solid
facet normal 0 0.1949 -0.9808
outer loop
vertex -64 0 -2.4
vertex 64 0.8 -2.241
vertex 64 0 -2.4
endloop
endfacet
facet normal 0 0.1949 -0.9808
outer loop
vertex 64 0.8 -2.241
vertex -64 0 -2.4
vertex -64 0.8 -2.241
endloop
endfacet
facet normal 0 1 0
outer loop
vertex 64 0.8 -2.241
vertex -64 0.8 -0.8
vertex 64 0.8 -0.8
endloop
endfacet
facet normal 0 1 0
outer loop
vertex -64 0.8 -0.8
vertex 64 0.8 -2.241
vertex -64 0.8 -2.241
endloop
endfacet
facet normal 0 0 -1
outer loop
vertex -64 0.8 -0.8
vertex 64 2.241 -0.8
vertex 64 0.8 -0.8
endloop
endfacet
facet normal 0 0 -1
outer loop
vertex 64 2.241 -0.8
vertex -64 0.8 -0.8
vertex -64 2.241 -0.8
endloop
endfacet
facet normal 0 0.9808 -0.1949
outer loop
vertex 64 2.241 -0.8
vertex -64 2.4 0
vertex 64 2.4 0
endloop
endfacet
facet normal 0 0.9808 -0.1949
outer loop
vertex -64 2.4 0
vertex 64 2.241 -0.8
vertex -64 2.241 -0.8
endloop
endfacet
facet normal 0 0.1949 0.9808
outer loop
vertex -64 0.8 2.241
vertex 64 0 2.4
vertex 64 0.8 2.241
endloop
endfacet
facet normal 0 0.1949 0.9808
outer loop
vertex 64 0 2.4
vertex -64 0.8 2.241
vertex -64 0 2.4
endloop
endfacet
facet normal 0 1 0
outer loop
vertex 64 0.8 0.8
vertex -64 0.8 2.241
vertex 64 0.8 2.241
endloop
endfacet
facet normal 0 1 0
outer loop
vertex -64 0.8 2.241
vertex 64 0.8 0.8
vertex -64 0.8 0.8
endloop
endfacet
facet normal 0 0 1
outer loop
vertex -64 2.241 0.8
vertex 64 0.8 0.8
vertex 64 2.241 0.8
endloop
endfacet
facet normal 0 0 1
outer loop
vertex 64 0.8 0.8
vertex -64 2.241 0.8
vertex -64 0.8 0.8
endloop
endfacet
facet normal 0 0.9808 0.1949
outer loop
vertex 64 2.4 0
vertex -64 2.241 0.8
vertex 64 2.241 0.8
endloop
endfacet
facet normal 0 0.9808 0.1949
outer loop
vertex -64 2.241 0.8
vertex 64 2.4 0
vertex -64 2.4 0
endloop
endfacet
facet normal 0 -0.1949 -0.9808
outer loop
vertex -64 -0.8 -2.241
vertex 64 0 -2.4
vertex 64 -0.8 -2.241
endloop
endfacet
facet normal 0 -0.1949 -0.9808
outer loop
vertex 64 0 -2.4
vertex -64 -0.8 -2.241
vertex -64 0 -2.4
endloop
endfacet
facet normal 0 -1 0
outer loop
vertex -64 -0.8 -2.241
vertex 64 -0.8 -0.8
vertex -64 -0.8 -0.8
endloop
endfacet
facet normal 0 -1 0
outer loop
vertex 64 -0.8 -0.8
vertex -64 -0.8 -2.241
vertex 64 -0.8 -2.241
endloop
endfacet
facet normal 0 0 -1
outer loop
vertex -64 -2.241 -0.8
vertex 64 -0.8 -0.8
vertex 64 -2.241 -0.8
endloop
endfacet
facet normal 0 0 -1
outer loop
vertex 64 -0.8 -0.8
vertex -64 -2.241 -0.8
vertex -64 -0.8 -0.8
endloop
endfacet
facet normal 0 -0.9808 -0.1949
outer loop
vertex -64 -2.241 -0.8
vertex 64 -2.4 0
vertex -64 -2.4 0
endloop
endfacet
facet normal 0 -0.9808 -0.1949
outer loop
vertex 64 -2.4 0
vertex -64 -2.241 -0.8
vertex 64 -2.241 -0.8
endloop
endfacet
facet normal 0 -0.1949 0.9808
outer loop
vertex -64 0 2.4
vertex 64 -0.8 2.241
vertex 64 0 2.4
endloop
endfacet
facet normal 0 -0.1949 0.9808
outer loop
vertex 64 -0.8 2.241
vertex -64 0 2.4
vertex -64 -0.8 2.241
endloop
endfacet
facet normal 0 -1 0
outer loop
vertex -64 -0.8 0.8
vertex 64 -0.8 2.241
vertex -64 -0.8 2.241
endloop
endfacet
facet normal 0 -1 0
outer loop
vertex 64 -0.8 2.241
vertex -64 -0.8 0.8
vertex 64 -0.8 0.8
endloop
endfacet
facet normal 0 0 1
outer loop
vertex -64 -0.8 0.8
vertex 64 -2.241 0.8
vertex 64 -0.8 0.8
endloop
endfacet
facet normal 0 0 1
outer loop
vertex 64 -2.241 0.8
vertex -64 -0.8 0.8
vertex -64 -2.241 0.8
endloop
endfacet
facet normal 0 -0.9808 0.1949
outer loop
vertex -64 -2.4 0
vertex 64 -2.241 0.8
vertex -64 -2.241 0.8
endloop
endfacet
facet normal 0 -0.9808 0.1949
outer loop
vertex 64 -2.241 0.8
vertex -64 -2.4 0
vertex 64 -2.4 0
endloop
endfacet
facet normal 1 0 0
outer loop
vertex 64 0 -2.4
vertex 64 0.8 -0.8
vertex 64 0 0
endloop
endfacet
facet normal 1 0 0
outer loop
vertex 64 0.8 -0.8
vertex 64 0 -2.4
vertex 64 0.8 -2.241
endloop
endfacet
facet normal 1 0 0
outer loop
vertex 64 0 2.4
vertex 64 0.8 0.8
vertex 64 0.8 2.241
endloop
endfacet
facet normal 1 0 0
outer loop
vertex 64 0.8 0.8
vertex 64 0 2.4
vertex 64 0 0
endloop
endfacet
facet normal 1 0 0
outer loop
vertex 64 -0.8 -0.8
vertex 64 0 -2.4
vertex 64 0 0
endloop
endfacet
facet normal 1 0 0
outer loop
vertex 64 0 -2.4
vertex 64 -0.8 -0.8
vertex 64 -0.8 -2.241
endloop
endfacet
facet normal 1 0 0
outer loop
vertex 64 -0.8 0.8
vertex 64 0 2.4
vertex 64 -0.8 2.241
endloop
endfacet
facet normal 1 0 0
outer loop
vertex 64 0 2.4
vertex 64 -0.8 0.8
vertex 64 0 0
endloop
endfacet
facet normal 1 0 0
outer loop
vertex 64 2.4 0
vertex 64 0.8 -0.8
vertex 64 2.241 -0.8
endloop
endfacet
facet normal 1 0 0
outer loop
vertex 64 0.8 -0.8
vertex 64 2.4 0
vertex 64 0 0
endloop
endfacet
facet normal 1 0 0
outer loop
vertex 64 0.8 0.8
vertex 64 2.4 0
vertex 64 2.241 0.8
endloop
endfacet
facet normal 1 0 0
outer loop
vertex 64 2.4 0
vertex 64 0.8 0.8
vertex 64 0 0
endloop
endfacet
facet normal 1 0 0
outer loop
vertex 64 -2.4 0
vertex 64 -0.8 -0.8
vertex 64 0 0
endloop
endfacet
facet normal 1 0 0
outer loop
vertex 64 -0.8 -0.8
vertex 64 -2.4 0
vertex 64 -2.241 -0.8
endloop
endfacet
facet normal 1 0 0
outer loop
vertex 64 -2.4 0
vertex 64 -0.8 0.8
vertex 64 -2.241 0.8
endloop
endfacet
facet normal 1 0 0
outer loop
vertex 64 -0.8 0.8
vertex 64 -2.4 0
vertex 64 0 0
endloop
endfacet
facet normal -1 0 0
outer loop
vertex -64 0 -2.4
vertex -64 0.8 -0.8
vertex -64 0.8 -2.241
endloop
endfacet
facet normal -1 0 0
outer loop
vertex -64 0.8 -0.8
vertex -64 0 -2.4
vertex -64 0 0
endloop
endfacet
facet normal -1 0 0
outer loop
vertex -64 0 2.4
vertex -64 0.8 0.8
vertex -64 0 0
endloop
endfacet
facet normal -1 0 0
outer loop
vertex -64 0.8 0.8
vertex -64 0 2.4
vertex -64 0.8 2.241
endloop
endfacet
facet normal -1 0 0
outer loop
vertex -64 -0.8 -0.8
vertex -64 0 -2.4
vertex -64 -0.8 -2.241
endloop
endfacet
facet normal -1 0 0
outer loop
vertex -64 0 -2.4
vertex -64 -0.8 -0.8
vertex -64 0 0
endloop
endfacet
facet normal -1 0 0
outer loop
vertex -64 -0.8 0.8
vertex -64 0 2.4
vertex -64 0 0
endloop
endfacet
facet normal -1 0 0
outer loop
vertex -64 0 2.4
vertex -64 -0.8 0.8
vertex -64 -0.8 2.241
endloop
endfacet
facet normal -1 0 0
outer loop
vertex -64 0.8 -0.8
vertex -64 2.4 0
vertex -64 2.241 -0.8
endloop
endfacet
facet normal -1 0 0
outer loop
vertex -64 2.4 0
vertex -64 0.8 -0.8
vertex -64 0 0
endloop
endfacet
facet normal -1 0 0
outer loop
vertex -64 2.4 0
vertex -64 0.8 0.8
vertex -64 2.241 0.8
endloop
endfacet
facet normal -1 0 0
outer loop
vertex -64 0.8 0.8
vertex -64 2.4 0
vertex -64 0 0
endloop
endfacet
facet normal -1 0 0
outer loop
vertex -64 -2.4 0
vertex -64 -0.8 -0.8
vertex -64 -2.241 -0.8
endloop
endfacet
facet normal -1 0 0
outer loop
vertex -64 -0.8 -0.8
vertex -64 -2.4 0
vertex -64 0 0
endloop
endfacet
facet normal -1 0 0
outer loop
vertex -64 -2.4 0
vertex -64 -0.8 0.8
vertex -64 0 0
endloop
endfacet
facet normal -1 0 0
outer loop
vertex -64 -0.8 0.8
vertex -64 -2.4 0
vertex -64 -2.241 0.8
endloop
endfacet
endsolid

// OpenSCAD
// file: ../p/axle.scad
use <../lib.scad>
function ldraw_lib__axle() = [
// 0 Axle
// 0 Name: axle.dat
// 0 Author: James Jessiman
// 0 !LDRAW_ORG Primitive UPDATE 2003-01
// 0 !LICENSE Licensed under CC BY 2.0 and CC BY 4.0 : see CAreadme.txt
// 
// 0 BFC CERTIFY CCW
  [0,"BFC","CERTIFY"],
  [0,"BFC","CCW"],
// 
// 0 !HISTORY 2000-04-23 [sbliss] Added conditional edges along outermost diameters
// 0 !HISTORY 2000-05-07 [PTadmin] Official Update 2000-01
// 0 !HISTORY 2002-11-08 [OrionP] Adjusted fit and precision
// 0 !HISTORY 2003-03-12 [PTadmin] Official Update 2003-01
// 0 !HISTORY 2007-06-24 [PTadmin] Header formatted for Contributor Agreement
// 0 !HISTORY 2008-07-01 [PTadmin] Official Update 2008-01
// 
// 
// 5 24 6 0 0 6 1 0 5.602 0 2 5.602 0 -2
  [5,24,6,0,0,6,1,0,5.602,0,2,5.602,0,-2],
// 5 24 0 0 6 0 1 6 2 0 5.602 -2 0 5.602
  [5,24,0,0,6,0,1,6,2,0,5.602,-2,0,5.602],
// 5 24 -6 0 0 -6 1 0 -5.602 0 -2 -5.602 0 2
  [5,24,-6,0,0,-6,1,0,-5.602,0,-2,-5.602,0,2],
// 5 24 0 0 -6 0 1 -6 -2 0 -5.602 2 0 -5.602
  [5,24,0,0,-6,0,1,-6,-2,0,-5.602,2,0,-5.602],
// 
// 2 24 6 0 0 5.602 0 2
  [2,24,6,0,0,5.602,0,2],
// 2 24 5.602 0 2 2 0 2
  [2,24,5.602,0,2,2,0,2],
// 2 24 2 0 2 2 0 5.602
  [2,24,2,0,2,2,0,5.602],
// 2 24 2 0 5.602 0 0 6
  [2,24,2,0,5.602,0,0,6],
// 2 24 -6 0 0 -5.602 0 2
  [2,24,-6,0,0,-5.602,0,2],
// 2 24 -5.602 0 2 -2 0 2
  [2,24,-5.602,0,2,-2,0,2],
// 2 24 -2 0 2 -2 0 5.602
  [2,24,-2,0,2,-2,0,5.602],
// 2 24 -2 0 5.602 -0 0 6
  [2,24,-2,0,5.602,-0,0,6],
// 2 24 6 0 -0 5.602 0 -2
  [2,24,6,0,-0,5.602,0,-2],
// 2 24 5.602 0 -2 2 0 -2
  [2,24,5.602,0,-2,2,0,-2],
// 2 24 2 0 -2 2 0 -5.602
  [2,24,2,0,-2,2,0,-5.602],
// 2 24 2 0 -5.602 0 0 -6
  [2,24,2,0,-5.602,0,0,-6],
// 2 24 -6 0 -0 -5.602 0 -2
  [2,24,-6,0,-0,-5.602,0,-2],
// 2 24 -5.602 0 -2 -2 0 -2
  [2,24,-5.602,0,-2,-2,0,-2],
// 2 24 -2 0 -2 -2 0 -5.602
  [2,24,-2,0,-2,-2,0,-5.602],
// 2 24 -2 0 -5.602 -0 0 -6
  [2,24,-2,0,-5.602,-0,0,-6],
// 2 24 6 1 0 5.602 1 2
  [2,24,6,1,0,5.602,1,2],
// 2 24 5.602 1 2 2 1 2
  [2,24,5.602,1,2,2,1,2],
// 2 24 2 1 2 2 1 5.602
  [2,24,2,1,2,2,1,5.602],
// 2 24 2 1 5.602 0 1 6
  [2,24,2,1,5.602,0,1,6],
// 2 24 -6 1 0 -5.602 1 2
  [2,24,-6,1,0,-5.602,1,2],
// 2 24 -5.602 1 2 -2 1 2
  [2,24,-5.602,1,2,-2,1,2],
// 2 24 -2 1 2 -2 1 5.602
  [2,24,-2,1,2,-2,1,5.602],
// 2 24 -2 1 5.602 -0 1 6
  [2,24,-2,1,5.602,-0,1,6],
// 2 24 6 1 -0 5.602 1 -2
  [2,24,6,1,-0,5.602,1,-2],
// 2 24 5.602 1 -2 2 1 -2
  [2,24,5.602,1,-2,2,1,-2],
// 2 24 2 1 -2 2 1 -5.602
  [2,24,2,1,-2,2,1,-5.602],
// 2 24 2 1 -5.602 0 1 -6
  [2,24,2,1,-5.602,0,1,-6],
// 2 24 -6 1 -0 -5.602 1 -2
  [2,24,-6,1,-0,-5.602,1,-2],
// 2 24 -5.602 1 -2 -2 1 -2
  [2,24,-5.602,1,-2,-2,1,-2],
// 2 24 -2 1 -2 -2 1 -5.602
  [2,24,-2,1,-2,-2,1,-5.602],
// 2 24 -2 1 -5.602 -0 1 -6
  [2,24,-2,1,-5.602,-0,1,-6],
// 
// 2 24 5.602 0 2 5.602 1 2
  [2,24,5.602,0,2,5.602,1,2],
// 2 24 2 0 2 2 1 2
  [2,24,2,0,2,2,1,2],
// 2 24 2 0 5.602 2 1 5.602
  [2,24,2,0,5.602,2,1,5.602],
// 2 24 -5.602 0 2 -5.602 1 2
  [2,24,-5.602,0,2,-5.602,1,2],
// 2 24 -2 0 2 -2 1 2
  [2,24,-2,0,2,-2,1,2],
// 2 24 -2 0 5.602 -2 1 5.602
  [2,24,-2,0,5.602,-2,1,5.602],
// 2 24 5.602 0 -2 5.602 1 -2
  [2,24,5.602,0,-2,5.602,1,-2],
// 2 24 2 0 -2 2 1 -2
  [2,24,2,0,-2,2,1,-2],
// 2 24 2 0 -5.602 2 1 -5.602
  [2,24,2,0,-5.602,2,1,-5.602],
// 2 24 -5.602 0 -2 -5.602 1 -2
  [2,24,-5.602,0,-2,-5.602,1,-2],
// 2 24 -2 0 -2 -2 1 -2
  [2,24,-2,0,-2,-2,1,-2],
// 2 24 -2 0 -5.602 -2 1 -5.602
  [2,24,-2,0,-5.602,-2,1,-5.602],
// 
// 4 16 6 0 0 6 1 0 5.602 1 2 5.602 0 2
  [4,16,6,0,0,6,1,0,5.602,1,2,5.602,0,2],
// 4 16 5.602 0 2 5.602 1 2 2 1 2 2 0 2
  [4,16,5.602,0,2,5.602,1,2,2,1,2,2,0,2],
// 4 16 2 0 2 2 1 2 2 1 5.602 2 0 5.602
  [4,16,2,0,2,2,1,2,2,1,5.602,2,0,5.602],
// 4 16 2 0 5.602 2 1 5.602 0 1 6 0 0 6
  [4,16,2,0,5.602,2,1,5.602,0,1,6,0,0,6],
// 4 16 -6 0 0 -5.602 0 2 -5.602 1 2 -6 1 0
  [4,16,-6,0,0,-5.602,0,2,-5.602,1,2,-6,1,0],
// 4 16 -5.602 0 2 -2 0 2 -2 1 2 -5.602 1 2
  [4,16,-5.602,0,2,-2,0,2,-2,1,2,-5.602,1,2],
// 4 16 -2 0 2 -2 0 5.602 -2 1 5.602 -2 1 2
  [4,16,-2,0,2,-2,0,5.602,-2,1,5.602,-2,1,2],
// 4 16 -2 0 5.602 -0 0 6 -0 1 6 -2 1 5.602
  [4,16,-2,0,5.602,-0,0,6,-0,1,6,-2,1,5.602],
// 4 16 6 0 -0 5.602 0 -2 5.602 1 -2 6 1 -0
  [4,16,6,0,-0,5.602,0,-2,5.602,1,-2,6,1,-0],
// 4 16 5.602 0 -2 2 0 -2 2 1 -2 5.602 1 -2
  [4,16,5.602,0,-2,2,0,-2,2,1,-2,5.602,1,-2],
// 4 16 2 0 -2 2 0 -5.602 2 1 -5.602 2 1 -2
  [4,16,2,0,-2,2,0,-5.602,2,1,-5.602,2,1,-2],
// 4 16 2 0 -5.602 0 0 -6 0 1 -6 2 1 -5.602
  [4,16,2,0,-5.602,0,0,-6,0,1,-6,2,1,-5.602],
// 4 16 -6 0 -0 -6 1 -0 -5.602 1 -2 -5.602 0 -2
  [4,16,-6,0,-0,-6,1,-0,-5.602,1,-2,-5.602,0,-2],
// 4 16 -5.602 0 -2 -5.602 1 -2 -2 1 -2 -2 0 -2
  [4,16,-5.602,0,-2,-5.602,1,-2,-2,1,-2,-2,0,-2],
// 4 16 -2 0 -2 -2 1 -2 -2 1 -5.602 -2 0 -5.602
  [4,16,-2,0,-2,-2,1,-2,-2,1,-5.602,-2,0,-5.602],
// 4 16 -2 0 -5.602 -2 1 -5.602 -0 1 -6 -0 0 -6
  [4,16,-2,0,-5.602,-2,1,-5.602,-0,1,-6,-0,0,-6],
// 
// 4 16 6 0 0 5.602 0 2 2 0 2 0 0 0
  [4,16,6,0,0,5.602,0,2,2,0,2,0,0,0],
// 4 16 -6 0 0 0 0 0 -2 0 2 -5.602 0 2
  [4,16,-6,0,0,0,0,0,-2,0,2,-5.602,0,2],
// 4 16 6 0 0 0 0 0 2 0 -2 5.602 0 -2
  [4,16,6,0,0,0,0,0,2,0,-2,5.602,0,-2],
// 4 16 -6 0 0 -5.602 0 -2 -2 0 -2 0 0 0
  [4,16,-6,0,0,-5.602,0,-2,-2,0,-2,0,0,0],
// 4 16 0 0 6 0 0 0 2 0 2 2 0 5.602
  [4,16,0,0,6,0,0,0,2,0,2,2,0,5.602],
// 4 16 0 0 6 -2 0 5.602 -2 0 2 0 0 0
  [4,16,0,0,6,-2,0,5.602,-2,0,2,0,0,0],
// 4 16 0 0 -6 2 0 -5.602 2 0 -2 0 0 0
  [4,16,0,0,-6,2,0,-5.602,2,0,-2,0,0,0],
// 4 16 0 0 -6 0 0 0 -2 0 -2 -2 0 -5.602
  [4,16,0,0,-6,0,0,0,-2,0,-2,-2,0,-5.602],
// 4 16 6 1 0 0 1 0 2 1 2 5.602 1 2
  [4,16,6,1,0,0,1,0,2,1,2,5.602,1,2],
// 4 16 -6 1 0 -5.602 1 2 -2 1 2 0 1 0
  [4,16,-6,1,0,-5.602,1,2,-2,1,2,0,1,0],
// 4 16 6 1 0 5.602 1 -2 2 1 -2 0 1 0
  [4,16,6,1,0,5.602,1,-2,2,1,-2,0,1,0],
// 4 16 -6 1 0 0 1 0 -2 1 -2 -5.602 1 -2
  [4,16,-6,1,0,0,1,0,-2,1,-2,-5.602,1,-2],
// 4 16 0 1 6 2 1 5.602 2 1 2 0 1 0
  [4,16,0,1,6,2,1,5.602,2,1,2,0,1,0],
// 4 16 0 1 6 0 1 0 -2 1 2 -2 1 5.602
  [4,16,0,1,6,0,1,0,-2,1,2,-2,1,5.602],
// 4 16 0 1 -6 0 1 0 2 1 -2 2 1 -5.602
  [4,16,0,1,-6,0,1,0,2,1,-2,2,1,-5.602],
// 4 16 0 1 -6 -2 1 -5.602 -2 1 -2 0 1 0
  [4,16,0,1,-6,-2,1,-5.602,-2,1,-2,0,1,0],
// 0
];
makepoly(ldraw_lib__axle(), line=0.2);
// main file
use <../lib.scad>
use <../p/axle.scad>
function ldraw_lib__50451() = [
// 0 Technic Axle 16
// 0 Name: 50451.dat
// 0 Author: Guy Vivan [guyvivan]
// 0 !LDRAW_ORG Part UPDATE 2009-01
// 0 !LICENSE Licensed under CC BY 2.0 and CC BY 4.0 : see CAreadme.txt
// 
// 0 BFC CERTIFY CCW
  [0,"BFC","CERTIFY"],
  [0,"BFC","CCW"],
// 
// 0 !HISTORY 2009-05-02 [PTadmin] Official Update 2009-01
// 
// 
// 1 16 160 0 0 0 -320 0 1 0 0 0 0 1 axle.dat
  [1,16,160,0,0,0,-320,0,1,0,0,0,0,1, ldraw_lib__axle()],
// 0
];
makepoly(ldraw_lib__50451(), line=0.2);
